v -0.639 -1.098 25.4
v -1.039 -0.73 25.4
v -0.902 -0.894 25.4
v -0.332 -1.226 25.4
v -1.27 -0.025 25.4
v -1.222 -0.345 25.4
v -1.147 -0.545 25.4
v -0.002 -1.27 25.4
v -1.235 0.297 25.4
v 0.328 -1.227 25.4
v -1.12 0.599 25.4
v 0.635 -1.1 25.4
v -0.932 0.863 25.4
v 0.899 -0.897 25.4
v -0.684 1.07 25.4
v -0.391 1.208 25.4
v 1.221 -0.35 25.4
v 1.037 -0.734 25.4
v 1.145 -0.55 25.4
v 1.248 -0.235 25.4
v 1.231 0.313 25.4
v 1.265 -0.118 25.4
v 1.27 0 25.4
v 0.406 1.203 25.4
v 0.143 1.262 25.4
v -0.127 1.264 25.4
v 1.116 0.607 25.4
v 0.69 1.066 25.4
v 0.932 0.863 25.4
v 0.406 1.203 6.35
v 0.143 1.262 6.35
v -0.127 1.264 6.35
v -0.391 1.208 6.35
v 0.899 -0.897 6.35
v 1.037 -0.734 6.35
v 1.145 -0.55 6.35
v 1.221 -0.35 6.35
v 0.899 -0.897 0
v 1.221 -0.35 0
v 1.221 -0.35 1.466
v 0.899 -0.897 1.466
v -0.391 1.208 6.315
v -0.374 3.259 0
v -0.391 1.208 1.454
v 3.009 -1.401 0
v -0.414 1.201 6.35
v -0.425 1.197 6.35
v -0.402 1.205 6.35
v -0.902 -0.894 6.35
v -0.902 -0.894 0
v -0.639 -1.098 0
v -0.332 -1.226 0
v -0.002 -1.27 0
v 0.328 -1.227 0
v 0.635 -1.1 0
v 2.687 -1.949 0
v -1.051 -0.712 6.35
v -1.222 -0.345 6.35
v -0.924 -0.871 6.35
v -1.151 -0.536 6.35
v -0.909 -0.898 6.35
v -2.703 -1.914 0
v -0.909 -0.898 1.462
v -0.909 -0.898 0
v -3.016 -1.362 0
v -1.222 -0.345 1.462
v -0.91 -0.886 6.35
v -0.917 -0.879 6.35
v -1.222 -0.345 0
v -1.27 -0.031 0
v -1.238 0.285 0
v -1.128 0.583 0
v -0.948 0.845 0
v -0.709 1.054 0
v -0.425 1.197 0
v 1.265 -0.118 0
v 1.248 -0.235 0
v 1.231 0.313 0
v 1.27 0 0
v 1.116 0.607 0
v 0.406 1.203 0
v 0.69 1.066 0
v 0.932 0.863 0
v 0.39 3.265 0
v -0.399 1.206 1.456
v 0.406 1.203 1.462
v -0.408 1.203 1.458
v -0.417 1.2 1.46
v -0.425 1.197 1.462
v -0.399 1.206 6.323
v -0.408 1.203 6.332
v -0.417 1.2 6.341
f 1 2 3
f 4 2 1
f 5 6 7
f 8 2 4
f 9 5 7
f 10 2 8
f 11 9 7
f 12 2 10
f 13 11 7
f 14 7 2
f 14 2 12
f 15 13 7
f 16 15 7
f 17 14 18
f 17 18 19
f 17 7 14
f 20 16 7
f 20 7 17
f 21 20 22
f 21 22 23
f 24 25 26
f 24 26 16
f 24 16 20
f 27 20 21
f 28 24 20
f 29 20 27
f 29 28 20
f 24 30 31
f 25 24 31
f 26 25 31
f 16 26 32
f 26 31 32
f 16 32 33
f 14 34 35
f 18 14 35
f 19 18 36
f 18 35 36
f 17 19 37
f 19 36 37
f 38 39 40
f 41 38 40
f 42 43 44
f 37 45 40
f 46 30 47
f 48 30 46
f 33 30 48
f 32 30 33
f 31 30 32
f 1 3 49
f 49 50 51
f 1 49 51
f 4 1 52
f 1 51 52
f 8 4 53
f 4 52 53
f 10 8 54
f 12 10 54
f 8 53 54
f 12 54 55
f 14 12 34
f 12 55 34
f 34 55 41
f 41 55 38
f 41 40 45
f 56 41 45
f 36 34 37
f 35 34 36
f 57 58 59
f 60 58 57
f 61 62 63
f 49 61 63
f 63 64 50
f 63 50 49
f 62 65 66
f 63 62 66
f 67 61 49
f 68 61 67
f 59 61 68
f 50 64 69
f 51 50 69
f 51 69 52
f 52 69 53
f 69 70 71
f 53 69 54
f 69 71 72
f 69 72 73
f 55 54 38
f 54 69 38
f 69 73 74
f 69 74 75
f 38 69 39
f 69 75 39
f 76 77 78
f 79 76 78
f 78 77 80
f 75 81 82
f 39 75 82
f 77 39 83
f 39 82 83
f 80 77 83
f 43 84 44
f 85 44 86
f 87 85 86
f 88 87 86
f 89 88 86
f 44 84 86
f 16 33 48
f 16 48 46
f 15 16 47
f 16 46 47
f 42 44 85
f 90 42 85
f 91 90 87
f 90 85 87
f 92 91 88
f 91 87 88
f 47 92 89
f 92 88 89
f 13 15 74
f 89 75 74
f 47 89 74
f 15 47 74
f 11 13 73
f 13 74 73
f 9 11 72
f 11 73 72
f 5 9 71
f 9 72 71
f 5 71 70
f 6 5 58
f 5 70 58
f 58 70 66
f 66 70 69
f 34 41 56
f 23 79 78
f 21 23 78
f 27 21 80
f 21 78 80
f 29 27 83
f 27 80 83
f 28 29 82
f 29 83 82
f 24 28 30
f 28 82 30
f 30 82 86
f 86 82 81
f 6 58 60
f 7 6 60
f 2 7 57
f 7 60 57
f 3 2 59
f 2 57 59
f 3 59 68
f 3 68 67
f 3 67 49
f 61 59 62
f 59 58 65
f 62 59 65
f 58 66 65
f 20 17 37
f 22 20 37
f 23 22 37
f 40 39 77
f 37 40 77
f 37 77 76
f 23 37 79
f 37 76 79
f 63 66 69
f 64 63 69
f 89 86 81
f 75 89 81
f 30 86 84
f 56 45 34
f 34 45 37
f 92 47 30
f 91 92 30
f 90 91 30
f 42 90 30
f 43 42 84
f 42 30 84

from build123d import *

# Parameters (mm, degrees)
F1_DEPTH   = 25.4
F2_DEPTH   = 6.35
F4_DEPTH   = 25.4
F5_DEPTH   = 25.4
F2_FACE2_W = 0.635
F2_FACE2_H = 6.35
F2_FACE3_W = 10.16
F2_FACE3_H = 6.35
F7_DEPTH   = 25.4
F9_DEPTH   = 25.4


with BuildPart() as f1:
    # F0 (on Top) → F1 (new body)
    with BuildSketch(Plane.XY):
        with BuildLine():
            ThreePointArc((1.2208780752, -0.3497952621), (1.2576595635, -0.1766137657), (1.27, 0))
            ThreePointArc((1.27, 0), (1.0317462976, 0.7405400579), (0.4063786184, 1.2032275007))
            ThreePointArc((0.4063786184, 1.2032275007), (0.0082488661, 1.2699732108), (-0.3907143254, 1.2084048642))
            ThreePointArc((-0.3907143254, 1.2084048642), (-1.1197739724, 0.5991713033), (-1.2221285, -0.3454011139))
            ThreePointArc((-1.2221285, -0.3454011139), (-1.0969705534, -0.6399653154), (-0.9021458423, -0.8938863906))
            ThreePointArc((-0.9021458423, -0.8938863906), (-0.0022842997, -1.2699979457), (0.8989244127, -0.897125911))
            ThreePointArc((0.8989244127, -0.897125911), (1.0946612978, -0.643907325), (1.2208780752, -0.3497952621))
        make_face()
    extrude(amount=F1_DEPTH)

    # F0 (on Top) → F2 (join)
    with BuildSketch(Plane.XY):
        with BuildLine():
            ThreePointArc((-0.9021458423, -0.8938863906), (-1.0969705534, -0.6399653154), (-1.2221285, -0.3454011139))
            Line((-1.2221285, -0.3454011139), (-10.0618945001, -5.3538077531))
            Line((-10.0618945001, -5.3538077531), (-9.7419118424, -5.9022930298))
            Line((-9.7419118424, -5.9022930298), (-0.9021458423, -0.8938863906))
        make_face()
        with BuildLine():
            ThreePointArc((-0.3907143254, 1.2084048642), (0.0082488661, 1.2699732108), (0.4063786184, 1.2032275007))
            Line((0.4063786184, 1.2032275007), (0.32674037, 11.3629153773))
            Line((0.32674037, 11.3629153773), (-0.3082387074, 11.3680701034))
            Line((-0.3082387074, 11.3680701034), (-0.3907143254, 1.2084048642))
        make_face()
        with BuildLine():
            Line((9.9781684573, -5.5010538621), (1.2208780752, -0.3497952621))
            ThreePointArc((1.2208780752, -0.3497952621), (1.0946612978, -0.643907325), (0.8989244127, -0.897125911))
            Line((0.8989244127, -0.897125911), (9.6562147948, -6.0483845109))
            Line((9.6562147948, -6.0483845109), (9.9781684573, -5.5010538621))
        make_face()
    extrude(amount=F2_DEPTH)

    # F3 (on face) → F4 (cut)
    with BuildSketch(Plane(origin=(0.1609768312, 0.2736653244, 0), x_dir=(-0.8619380297, 0.5070136417, 0), z_dir=(0.5070136417, 0.8619380297, 0))):
        Polygon((-11.3896722124, 0), (-3.303936429, 0), (-1.2296722124, 6.35), (-11.3896722124, 6.35), align=None)
    extrude(amount=-F4_DEPTH, mode=Mode.SUBTRACT)

    # F3 (on face) → F5 (cut)
    with BuildSketch(Plane(origin=(0.1609768312, 0.2736653244, 0), x_dir=(-0.8619380297, 0.5070136417, 0), z_dir=(0.5070136417, 0.8619380297, 0))):
        Polygon((-1.2296722124, 0), (-1.2296722124, 1.4659563295), (-3.303936429, 0), align=None)
    extrude(amount=-F5_DEPTH, mode=Mode.SUBTRACT)

    # F6 (on face) + F2_face2 (on face) + F2_face3 (on face) → F7 (cut)
    with BuildSketch(Plane(origin=(0.4157847513, 0.0032591916, 0), x_dir=(-0.0078384103, 0.9999692792, 0), z_dir=(0.9999692792, 0.0078384103, 0))):
        Polygon((1.2000051743, 6.35), (3.2617810744, 0), (11.3600051743, 0), (11.3600051743, 6.35), align=None)
        Polygon((3.2617810744, 0), (1.2000051743, 1.46235188), (1.2000051743, 0), align=None)
    with BuildSketch(Plane(origin=(0.0092508313, 11.3654927404, 3.175), x_dir=(-0.9999670511, 0.0081176789, 0), z_dir=(0.0081176789, 0.9999670511, 0))):
        Rectangle(F2_FACE2_W, F2_FACE2_H)
    with BuildSketch(Plane(origin=(-0.3494765164, 6.2882374838, 3.175), x_dir=(-0.0081176789, -0.9999670511, 0), z_dir=(-0.9999670511, 0.0081176789, 0))):
        Rectangle(F2_FACE3_W, F2_FACE3_H)
    extrude(amount=-F7_DEPTH, dir=(0.9999692792, 0.0078384103, 0), mode=Mode.SUBTRACT)

    # F8 (on face) → F9 (cut)
    with BuildSketch(Plane(origin=(-0.1488394932, 0.2626995742, 0), x_dir=(-0.8700557087, -0.4929534094, 0), z_dir=(-0.4929534094, 0.8700557087, 0))):
        Polygon((1.2335865348, 6.35), (3.295362435, 0), (11.3935865348, 0), (11.3935865348, 6.35), align=None)
        Polygon((3.295362435, 0), (1.2335865348, 1.46235188), (1.2335865348, 0), align=None)
    extrude(amount=-F9_DEPTH, mode=Mode.SUBTRACT)


solid = f1.part
